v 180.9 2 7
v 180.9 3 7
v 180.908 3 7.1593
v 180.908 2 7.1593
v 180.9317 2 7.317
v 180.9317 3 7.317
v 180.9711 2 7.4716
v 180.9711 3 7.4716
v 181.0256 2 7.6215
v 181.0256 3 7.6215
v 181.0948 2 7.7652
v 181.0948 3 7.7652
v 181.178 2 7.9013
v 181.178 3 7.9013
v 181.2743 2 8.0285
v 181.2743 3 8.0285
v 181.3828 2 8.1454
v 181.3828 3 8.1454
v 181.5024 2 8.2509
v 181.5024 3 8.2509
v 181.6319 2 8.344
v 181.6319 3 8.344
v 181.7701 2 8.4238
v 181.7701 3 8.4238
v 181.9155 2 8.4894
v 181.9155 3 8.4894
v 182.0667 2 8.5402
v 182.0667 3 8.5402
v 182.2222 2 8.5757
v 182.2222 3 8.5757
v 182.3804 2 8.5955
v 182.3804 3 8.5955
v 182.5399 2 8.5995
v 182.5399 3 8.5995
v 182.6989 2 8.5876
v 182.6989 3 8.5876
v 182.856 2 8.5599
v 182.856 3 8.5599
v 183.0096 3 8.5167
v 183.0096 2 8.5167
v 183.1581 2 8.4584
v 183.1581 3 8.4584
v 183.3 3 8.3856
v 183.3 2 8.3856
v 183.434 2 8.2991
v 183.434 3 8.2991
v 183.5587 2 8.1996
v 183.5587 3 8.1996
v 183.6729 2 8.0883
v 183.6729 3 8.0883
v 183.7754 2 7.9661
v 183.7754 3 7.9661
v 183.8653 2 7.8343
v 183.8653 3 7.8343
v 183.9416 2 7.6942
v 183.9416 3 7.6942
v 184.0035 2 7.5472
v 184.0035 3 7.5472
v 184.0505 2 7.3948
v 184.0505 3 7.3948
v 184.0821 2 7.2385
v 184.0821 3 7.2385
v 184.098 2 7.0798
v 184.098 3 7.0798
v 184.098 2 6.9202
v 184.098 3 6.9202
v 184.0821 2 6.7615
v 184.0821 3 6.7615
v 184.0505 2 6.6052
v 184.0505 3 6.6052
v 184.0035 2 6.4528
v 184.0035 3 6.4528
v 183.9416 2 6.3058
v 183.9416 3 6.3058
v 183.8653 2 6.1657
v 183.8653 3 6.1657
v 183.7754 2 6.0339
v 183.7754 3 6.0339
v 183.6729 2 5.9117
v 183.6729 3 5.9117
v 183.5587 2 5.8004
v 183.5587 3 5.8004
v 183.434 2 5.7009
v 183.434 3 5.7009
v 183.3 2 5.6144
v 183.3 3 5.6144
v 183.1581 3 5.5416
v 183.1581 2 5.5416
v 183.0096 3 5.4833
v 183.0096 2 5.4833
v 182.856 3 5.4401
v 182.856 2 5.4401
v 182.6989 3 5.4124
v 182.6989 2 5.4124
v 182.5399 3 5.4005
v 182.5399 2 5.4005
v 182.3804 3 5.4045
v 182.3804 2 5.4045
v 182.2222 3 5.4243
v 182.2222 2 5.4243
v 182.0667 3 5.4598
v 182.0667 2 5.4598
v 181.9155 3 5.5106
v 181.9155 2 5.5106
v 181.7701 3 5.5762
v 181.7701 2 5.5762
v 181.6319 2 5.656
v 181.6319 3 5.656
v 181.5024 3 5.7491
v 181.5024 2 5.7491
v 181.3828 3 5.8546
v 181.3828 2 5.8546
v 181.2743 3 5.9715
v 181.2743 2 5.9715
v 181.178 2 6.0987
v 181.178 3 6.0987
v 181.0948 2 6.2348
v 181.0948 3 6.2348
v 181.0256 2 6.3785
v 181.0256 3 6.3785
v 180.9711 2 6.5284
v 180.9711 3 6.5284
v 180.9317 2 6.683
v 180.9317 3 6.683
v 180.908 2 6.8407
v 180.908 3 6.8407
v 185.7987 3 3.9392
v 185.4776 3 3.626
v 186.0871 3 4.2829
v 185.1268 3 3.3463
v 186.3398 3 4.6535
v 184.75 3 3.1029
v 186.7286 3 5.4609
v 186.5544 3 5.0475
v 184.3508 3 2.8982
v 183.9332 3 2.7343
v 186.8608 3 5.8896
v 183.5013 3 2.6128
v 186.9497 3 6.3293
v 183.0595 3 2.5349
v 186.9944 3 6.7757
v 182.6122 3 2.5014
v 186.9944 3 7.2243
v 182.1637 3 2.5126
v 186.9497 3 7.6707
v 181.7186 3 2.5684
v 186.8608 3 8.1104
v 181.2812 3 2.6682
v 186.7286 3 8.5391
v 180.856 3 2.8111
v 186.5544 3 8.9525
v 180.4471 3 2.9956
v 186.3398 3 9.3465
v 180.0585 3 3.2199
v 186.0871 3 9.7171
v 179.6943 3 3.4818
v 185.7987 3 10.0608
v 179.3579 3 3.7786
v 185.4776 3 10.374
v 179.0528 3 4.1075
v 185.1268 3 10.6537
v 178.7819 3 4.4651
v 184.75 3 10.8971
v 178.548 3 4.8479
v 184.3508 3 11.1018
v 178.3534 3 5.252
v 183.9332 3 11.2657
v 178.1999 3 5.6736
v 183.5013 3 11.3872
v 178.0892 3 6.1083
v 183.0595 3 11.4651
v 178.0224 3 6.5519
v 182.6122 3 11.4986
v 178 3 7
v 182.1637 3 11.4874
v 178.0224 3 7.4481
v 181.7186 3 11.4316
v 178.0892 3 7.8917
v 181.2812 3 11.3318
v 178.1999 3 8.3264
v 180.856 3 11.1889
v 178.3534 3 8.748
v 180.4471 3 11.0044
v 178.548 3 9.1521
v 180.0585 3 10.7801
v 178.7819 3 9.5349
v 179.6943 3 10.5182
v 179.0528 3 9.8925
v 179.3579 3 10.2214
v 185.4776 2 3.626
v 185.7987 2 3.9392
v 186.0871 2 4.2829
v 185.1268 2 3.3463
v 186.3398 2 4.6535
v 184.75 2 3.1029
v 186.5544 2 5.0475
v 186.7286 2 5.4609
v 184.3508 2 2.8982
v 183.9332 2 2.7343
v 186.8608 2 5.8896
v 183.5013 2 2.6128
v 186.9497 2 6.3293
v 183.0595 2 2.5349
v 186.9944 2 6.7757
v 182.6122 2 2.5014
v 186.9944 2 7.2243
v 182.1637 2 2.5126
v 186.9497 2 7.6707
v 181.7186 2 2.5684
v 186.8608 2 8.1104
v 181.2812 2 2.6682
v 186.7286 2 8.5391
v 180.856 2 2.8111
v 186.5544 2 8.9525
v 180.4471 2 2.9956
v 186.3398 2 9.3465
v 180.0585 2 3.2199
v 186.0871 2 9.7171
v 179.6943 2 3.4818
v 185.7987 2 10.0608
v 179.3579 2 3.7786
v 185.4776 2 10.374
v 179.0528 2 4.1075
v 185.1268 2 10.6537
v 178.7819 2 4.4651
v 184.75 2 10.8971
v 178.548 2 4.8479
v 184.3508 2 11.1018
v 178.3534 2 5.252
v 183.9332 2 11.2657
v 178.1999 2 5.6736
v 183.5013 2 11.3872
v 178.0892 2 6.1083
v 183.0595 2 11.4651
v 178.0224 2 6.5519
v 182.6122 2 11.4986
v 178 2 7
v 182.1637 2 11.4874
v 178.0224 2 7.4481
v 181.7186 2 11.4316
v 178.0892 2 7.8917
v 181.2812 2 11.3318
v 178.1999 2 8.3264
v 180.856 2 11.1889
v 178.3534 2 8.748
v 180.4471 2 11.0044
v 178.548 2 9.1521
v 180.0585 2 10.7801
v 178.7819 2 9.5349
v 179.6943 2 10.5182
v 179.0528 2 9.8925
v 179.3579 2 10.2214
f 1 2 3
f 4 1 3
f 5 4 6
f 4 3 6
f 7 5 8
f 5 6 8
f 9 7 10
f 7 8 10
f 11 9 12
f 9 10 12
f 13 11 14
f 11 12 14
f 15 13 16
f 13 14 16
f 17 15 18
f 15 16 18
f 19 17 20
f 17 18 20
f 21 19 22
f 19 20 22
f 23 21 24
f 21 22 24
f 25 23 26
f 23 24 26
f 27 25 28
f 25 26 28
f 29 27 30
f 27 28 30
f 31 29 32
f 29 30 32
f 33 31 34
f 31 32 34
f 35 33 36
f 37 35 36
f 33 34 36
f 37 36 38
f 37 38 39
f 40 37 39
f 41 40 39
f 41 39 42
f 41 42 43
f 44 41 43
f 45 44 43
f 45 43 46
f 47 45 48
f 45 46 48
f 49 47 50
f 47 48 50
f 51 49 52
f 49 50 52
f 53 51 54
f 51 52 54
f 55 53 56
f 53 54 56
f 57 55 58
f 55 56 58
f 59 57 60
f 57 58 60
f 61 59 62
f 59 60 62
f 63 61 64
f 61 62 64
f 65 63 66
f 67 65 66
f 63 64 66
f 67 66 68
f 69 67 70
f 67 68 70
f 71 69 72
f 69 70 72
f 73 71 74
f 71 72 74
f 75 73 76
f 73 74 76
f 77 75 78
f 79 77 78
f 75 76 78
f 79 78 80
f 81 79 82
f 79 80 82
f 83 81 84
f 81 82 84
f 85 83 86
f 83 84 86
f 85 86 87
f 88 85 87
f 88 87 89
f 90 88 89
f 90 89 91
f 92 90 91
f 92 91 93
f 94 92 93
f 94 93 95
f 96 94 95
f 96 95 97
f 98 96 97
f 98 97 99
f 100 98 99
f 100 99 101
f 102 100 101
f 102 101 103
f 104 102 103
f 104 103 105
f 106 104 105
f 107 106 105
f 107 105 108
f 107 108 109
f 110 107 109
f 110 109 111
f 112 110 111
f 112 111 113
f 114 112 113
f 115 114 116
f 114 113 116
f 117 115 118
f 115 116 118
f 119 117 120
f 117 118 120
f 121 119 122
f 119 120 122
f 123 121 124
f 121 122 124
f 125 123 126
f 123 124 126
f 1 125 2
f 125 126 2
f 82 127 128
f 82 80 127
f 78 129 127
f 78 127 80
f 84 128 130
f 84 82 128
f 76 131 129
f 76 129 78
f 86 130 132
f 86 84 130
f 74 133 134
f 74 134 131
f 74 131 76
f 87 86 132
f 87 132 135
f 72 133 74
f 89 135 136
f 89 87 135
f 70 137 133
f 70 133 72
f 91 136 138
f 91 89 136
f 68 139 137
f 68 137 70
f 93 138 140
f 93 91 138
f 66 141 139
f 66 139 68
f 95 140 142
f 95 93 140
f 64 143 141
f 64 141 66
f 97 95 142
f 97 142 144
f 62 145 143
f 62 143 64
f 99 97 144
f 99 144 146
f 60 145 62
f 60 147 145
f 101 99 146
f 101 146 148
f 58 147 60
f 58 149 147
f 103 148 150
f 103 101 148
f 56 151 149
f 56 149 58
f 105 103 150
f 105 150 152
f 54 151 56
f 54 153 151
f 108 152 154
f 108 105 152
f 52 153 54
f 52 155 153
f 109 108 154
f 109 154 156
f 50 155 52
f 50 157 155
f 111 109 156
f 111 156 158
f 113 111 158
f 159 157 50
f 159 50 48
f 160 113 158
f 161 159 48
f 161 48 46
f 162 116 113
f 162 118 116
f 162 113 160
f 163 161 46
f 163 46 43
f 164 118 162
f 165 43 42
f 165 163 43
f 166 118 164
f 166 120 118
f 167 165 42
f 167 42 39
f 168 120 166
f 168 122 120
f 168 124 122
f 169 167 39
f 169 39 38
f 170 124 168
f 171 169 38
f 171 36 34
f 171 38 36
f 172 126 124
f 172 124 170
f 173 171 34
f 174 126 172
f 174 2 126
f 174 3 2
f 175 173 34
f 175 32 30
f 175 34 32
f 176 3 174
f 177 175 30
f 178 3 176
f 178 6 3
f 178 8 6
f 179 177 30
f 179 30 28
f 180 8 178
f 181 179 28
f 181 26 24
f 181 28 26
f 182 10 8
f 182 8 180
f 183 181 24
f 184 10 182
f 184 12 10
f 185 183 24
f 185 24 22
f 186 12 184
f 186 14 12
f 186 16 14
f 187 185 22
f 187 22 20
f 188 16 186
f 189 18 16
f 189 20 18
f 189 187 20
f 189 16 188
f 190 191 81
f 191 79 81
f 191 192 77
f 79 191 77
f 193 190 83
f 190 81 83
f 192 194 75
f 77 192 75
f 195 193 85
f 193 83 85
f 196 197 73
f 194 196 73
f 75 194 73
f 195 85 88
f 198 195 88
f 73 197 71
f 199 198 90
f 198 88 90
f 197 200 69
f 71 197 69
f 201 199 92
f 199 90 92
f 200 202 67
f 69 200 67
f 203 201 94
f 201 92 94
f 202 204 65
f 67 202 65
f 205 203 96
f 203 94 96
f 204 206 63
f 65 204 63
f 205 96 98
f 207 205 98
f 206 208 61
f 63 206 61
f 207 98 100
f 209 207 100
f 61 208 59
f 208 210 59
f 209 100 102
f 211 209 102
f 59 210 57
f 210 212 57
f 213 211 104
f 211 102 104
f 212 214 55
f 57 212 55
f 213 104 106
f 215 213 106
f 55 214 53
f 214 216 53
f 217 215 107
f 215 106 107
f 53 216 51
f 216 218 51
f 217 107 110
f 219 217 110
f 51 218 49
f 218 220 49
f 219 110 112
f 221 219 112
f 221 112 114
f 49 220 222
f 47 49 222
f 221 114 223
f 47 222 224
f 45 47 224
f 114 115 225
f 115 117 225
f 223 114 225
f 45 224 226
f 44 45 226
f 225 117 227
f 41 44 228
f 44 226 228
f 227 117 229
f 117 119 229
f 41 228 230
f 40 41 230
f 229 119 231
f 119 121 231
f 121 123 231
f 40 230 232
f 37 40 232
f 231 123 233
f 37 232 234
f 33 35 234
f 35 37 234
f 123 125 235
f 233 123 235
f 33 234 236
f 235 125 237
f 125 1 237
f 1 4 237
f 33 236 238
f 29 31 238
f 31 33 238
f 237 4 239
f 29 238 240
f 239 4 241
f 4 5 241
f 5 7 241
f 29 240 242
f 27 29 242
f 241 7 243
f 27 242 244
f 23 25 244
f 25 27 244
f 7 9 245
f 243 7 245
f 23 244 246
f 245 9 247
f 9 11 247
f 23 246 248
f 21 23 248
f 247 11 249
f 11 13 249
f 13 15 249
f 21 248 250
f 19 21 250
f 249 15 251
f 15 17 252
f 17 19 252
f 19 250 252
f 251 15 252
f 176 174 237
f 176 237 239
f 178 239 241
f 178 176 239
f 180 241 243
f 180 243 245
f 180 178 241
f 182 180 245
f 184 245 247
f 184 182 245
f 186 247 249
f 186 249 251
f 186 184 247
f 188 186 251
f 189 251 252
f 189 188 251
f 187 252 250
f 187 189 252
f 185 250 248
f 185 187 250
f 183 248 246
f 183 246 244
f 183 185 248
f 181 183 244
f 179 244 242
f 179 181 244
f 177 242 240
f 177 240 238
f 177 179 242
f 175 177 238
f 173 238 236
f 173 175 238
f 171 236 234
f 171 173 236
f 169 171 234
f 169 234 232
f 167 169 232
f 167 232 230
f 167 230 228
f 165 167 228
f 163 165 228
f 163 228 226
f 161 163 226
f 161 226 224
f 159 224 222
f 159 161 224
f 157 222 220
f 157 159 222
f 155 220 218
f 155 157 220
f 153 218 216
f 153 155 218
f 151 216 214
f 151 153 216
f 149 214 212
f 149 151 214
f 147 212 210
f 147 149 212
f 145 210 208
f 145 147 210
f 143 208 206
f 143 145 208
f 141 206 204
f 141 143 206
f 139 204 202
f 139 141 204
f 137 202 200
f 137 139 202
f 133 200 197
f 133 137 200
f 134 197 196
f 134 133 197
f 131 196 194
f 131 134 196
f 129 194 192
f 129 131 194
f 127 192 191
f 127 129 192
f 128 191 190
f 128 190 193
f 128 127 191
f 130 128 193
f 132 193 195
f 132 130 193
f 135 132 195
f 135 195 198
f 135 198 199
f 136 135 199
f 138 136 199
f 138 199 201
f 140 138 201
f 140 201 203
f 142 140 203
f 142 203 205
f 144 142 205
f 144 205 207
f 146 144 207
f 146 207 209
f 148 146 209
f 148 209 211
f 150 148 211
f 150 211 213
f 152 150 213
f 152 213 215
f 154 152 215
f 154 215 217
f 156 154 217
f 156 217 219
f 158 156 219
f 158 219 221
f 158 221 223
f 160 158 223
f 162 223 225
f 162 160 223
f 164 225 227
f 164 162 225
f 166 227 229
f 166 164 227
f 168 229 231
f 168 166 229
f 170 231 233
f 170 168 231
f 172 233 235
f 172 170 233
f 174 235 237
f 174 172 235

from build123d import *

# Parameters (mm, degrees)
CYLINDER018_R          = 1.6
CYLINDER018_DEPTH      = 1
CYLINDER017_R          = 4.5
CYLINDER017_DEPTH      = 1
CUT020_PLACEMENT_ANGLE = 90


with BuildPart() as facewasherscrewhole:
    # Cylinder018 → Cylinder018 (new body)
    with BuildSketch(Plane.XY):
        Circle(CYLINDER018_R)
    extrude(amount=CYLINDER018_DEPTH)


with BuildPart() as facewasher001:
    # Cylinder017 → Cylinder017 (new body)
    with BuildSketch(Plane.XY):
        Circle(CYLINDER017_R)
    extrude(amount=CYLINDER017_DEPTH)

    # Cut020: cut FaceWasherScrewHole
    add(facewasherscrewhole.part, mode=Mode.SUBTRACT)


with BuildPart() as facewasher001_1:
    # Cut020 placement: moved
    add(facewasher001.part.moved(Location((0, 0, -1))).rotate(Axis((0, 0, -1), (1, 0, 0)), CUT020_PLACEMENT_ANGLE))


with BuildPart() as facewasher001_2:
    # Clone021 placement: moved
    add(facewasher001_1.part.moved(Location((-8.5, 3, 8))))


with BuildPart() as part_mirroring023:
    # Part__Mirroring023: instance of FaceWasher001
    add(facewasher001_2.part.mirror(Plane(origin=(87, 0, 0), x_dir=(0, -1, 0), z_dir=(1, 0, 0))))


solid = part_mirroring023.part
